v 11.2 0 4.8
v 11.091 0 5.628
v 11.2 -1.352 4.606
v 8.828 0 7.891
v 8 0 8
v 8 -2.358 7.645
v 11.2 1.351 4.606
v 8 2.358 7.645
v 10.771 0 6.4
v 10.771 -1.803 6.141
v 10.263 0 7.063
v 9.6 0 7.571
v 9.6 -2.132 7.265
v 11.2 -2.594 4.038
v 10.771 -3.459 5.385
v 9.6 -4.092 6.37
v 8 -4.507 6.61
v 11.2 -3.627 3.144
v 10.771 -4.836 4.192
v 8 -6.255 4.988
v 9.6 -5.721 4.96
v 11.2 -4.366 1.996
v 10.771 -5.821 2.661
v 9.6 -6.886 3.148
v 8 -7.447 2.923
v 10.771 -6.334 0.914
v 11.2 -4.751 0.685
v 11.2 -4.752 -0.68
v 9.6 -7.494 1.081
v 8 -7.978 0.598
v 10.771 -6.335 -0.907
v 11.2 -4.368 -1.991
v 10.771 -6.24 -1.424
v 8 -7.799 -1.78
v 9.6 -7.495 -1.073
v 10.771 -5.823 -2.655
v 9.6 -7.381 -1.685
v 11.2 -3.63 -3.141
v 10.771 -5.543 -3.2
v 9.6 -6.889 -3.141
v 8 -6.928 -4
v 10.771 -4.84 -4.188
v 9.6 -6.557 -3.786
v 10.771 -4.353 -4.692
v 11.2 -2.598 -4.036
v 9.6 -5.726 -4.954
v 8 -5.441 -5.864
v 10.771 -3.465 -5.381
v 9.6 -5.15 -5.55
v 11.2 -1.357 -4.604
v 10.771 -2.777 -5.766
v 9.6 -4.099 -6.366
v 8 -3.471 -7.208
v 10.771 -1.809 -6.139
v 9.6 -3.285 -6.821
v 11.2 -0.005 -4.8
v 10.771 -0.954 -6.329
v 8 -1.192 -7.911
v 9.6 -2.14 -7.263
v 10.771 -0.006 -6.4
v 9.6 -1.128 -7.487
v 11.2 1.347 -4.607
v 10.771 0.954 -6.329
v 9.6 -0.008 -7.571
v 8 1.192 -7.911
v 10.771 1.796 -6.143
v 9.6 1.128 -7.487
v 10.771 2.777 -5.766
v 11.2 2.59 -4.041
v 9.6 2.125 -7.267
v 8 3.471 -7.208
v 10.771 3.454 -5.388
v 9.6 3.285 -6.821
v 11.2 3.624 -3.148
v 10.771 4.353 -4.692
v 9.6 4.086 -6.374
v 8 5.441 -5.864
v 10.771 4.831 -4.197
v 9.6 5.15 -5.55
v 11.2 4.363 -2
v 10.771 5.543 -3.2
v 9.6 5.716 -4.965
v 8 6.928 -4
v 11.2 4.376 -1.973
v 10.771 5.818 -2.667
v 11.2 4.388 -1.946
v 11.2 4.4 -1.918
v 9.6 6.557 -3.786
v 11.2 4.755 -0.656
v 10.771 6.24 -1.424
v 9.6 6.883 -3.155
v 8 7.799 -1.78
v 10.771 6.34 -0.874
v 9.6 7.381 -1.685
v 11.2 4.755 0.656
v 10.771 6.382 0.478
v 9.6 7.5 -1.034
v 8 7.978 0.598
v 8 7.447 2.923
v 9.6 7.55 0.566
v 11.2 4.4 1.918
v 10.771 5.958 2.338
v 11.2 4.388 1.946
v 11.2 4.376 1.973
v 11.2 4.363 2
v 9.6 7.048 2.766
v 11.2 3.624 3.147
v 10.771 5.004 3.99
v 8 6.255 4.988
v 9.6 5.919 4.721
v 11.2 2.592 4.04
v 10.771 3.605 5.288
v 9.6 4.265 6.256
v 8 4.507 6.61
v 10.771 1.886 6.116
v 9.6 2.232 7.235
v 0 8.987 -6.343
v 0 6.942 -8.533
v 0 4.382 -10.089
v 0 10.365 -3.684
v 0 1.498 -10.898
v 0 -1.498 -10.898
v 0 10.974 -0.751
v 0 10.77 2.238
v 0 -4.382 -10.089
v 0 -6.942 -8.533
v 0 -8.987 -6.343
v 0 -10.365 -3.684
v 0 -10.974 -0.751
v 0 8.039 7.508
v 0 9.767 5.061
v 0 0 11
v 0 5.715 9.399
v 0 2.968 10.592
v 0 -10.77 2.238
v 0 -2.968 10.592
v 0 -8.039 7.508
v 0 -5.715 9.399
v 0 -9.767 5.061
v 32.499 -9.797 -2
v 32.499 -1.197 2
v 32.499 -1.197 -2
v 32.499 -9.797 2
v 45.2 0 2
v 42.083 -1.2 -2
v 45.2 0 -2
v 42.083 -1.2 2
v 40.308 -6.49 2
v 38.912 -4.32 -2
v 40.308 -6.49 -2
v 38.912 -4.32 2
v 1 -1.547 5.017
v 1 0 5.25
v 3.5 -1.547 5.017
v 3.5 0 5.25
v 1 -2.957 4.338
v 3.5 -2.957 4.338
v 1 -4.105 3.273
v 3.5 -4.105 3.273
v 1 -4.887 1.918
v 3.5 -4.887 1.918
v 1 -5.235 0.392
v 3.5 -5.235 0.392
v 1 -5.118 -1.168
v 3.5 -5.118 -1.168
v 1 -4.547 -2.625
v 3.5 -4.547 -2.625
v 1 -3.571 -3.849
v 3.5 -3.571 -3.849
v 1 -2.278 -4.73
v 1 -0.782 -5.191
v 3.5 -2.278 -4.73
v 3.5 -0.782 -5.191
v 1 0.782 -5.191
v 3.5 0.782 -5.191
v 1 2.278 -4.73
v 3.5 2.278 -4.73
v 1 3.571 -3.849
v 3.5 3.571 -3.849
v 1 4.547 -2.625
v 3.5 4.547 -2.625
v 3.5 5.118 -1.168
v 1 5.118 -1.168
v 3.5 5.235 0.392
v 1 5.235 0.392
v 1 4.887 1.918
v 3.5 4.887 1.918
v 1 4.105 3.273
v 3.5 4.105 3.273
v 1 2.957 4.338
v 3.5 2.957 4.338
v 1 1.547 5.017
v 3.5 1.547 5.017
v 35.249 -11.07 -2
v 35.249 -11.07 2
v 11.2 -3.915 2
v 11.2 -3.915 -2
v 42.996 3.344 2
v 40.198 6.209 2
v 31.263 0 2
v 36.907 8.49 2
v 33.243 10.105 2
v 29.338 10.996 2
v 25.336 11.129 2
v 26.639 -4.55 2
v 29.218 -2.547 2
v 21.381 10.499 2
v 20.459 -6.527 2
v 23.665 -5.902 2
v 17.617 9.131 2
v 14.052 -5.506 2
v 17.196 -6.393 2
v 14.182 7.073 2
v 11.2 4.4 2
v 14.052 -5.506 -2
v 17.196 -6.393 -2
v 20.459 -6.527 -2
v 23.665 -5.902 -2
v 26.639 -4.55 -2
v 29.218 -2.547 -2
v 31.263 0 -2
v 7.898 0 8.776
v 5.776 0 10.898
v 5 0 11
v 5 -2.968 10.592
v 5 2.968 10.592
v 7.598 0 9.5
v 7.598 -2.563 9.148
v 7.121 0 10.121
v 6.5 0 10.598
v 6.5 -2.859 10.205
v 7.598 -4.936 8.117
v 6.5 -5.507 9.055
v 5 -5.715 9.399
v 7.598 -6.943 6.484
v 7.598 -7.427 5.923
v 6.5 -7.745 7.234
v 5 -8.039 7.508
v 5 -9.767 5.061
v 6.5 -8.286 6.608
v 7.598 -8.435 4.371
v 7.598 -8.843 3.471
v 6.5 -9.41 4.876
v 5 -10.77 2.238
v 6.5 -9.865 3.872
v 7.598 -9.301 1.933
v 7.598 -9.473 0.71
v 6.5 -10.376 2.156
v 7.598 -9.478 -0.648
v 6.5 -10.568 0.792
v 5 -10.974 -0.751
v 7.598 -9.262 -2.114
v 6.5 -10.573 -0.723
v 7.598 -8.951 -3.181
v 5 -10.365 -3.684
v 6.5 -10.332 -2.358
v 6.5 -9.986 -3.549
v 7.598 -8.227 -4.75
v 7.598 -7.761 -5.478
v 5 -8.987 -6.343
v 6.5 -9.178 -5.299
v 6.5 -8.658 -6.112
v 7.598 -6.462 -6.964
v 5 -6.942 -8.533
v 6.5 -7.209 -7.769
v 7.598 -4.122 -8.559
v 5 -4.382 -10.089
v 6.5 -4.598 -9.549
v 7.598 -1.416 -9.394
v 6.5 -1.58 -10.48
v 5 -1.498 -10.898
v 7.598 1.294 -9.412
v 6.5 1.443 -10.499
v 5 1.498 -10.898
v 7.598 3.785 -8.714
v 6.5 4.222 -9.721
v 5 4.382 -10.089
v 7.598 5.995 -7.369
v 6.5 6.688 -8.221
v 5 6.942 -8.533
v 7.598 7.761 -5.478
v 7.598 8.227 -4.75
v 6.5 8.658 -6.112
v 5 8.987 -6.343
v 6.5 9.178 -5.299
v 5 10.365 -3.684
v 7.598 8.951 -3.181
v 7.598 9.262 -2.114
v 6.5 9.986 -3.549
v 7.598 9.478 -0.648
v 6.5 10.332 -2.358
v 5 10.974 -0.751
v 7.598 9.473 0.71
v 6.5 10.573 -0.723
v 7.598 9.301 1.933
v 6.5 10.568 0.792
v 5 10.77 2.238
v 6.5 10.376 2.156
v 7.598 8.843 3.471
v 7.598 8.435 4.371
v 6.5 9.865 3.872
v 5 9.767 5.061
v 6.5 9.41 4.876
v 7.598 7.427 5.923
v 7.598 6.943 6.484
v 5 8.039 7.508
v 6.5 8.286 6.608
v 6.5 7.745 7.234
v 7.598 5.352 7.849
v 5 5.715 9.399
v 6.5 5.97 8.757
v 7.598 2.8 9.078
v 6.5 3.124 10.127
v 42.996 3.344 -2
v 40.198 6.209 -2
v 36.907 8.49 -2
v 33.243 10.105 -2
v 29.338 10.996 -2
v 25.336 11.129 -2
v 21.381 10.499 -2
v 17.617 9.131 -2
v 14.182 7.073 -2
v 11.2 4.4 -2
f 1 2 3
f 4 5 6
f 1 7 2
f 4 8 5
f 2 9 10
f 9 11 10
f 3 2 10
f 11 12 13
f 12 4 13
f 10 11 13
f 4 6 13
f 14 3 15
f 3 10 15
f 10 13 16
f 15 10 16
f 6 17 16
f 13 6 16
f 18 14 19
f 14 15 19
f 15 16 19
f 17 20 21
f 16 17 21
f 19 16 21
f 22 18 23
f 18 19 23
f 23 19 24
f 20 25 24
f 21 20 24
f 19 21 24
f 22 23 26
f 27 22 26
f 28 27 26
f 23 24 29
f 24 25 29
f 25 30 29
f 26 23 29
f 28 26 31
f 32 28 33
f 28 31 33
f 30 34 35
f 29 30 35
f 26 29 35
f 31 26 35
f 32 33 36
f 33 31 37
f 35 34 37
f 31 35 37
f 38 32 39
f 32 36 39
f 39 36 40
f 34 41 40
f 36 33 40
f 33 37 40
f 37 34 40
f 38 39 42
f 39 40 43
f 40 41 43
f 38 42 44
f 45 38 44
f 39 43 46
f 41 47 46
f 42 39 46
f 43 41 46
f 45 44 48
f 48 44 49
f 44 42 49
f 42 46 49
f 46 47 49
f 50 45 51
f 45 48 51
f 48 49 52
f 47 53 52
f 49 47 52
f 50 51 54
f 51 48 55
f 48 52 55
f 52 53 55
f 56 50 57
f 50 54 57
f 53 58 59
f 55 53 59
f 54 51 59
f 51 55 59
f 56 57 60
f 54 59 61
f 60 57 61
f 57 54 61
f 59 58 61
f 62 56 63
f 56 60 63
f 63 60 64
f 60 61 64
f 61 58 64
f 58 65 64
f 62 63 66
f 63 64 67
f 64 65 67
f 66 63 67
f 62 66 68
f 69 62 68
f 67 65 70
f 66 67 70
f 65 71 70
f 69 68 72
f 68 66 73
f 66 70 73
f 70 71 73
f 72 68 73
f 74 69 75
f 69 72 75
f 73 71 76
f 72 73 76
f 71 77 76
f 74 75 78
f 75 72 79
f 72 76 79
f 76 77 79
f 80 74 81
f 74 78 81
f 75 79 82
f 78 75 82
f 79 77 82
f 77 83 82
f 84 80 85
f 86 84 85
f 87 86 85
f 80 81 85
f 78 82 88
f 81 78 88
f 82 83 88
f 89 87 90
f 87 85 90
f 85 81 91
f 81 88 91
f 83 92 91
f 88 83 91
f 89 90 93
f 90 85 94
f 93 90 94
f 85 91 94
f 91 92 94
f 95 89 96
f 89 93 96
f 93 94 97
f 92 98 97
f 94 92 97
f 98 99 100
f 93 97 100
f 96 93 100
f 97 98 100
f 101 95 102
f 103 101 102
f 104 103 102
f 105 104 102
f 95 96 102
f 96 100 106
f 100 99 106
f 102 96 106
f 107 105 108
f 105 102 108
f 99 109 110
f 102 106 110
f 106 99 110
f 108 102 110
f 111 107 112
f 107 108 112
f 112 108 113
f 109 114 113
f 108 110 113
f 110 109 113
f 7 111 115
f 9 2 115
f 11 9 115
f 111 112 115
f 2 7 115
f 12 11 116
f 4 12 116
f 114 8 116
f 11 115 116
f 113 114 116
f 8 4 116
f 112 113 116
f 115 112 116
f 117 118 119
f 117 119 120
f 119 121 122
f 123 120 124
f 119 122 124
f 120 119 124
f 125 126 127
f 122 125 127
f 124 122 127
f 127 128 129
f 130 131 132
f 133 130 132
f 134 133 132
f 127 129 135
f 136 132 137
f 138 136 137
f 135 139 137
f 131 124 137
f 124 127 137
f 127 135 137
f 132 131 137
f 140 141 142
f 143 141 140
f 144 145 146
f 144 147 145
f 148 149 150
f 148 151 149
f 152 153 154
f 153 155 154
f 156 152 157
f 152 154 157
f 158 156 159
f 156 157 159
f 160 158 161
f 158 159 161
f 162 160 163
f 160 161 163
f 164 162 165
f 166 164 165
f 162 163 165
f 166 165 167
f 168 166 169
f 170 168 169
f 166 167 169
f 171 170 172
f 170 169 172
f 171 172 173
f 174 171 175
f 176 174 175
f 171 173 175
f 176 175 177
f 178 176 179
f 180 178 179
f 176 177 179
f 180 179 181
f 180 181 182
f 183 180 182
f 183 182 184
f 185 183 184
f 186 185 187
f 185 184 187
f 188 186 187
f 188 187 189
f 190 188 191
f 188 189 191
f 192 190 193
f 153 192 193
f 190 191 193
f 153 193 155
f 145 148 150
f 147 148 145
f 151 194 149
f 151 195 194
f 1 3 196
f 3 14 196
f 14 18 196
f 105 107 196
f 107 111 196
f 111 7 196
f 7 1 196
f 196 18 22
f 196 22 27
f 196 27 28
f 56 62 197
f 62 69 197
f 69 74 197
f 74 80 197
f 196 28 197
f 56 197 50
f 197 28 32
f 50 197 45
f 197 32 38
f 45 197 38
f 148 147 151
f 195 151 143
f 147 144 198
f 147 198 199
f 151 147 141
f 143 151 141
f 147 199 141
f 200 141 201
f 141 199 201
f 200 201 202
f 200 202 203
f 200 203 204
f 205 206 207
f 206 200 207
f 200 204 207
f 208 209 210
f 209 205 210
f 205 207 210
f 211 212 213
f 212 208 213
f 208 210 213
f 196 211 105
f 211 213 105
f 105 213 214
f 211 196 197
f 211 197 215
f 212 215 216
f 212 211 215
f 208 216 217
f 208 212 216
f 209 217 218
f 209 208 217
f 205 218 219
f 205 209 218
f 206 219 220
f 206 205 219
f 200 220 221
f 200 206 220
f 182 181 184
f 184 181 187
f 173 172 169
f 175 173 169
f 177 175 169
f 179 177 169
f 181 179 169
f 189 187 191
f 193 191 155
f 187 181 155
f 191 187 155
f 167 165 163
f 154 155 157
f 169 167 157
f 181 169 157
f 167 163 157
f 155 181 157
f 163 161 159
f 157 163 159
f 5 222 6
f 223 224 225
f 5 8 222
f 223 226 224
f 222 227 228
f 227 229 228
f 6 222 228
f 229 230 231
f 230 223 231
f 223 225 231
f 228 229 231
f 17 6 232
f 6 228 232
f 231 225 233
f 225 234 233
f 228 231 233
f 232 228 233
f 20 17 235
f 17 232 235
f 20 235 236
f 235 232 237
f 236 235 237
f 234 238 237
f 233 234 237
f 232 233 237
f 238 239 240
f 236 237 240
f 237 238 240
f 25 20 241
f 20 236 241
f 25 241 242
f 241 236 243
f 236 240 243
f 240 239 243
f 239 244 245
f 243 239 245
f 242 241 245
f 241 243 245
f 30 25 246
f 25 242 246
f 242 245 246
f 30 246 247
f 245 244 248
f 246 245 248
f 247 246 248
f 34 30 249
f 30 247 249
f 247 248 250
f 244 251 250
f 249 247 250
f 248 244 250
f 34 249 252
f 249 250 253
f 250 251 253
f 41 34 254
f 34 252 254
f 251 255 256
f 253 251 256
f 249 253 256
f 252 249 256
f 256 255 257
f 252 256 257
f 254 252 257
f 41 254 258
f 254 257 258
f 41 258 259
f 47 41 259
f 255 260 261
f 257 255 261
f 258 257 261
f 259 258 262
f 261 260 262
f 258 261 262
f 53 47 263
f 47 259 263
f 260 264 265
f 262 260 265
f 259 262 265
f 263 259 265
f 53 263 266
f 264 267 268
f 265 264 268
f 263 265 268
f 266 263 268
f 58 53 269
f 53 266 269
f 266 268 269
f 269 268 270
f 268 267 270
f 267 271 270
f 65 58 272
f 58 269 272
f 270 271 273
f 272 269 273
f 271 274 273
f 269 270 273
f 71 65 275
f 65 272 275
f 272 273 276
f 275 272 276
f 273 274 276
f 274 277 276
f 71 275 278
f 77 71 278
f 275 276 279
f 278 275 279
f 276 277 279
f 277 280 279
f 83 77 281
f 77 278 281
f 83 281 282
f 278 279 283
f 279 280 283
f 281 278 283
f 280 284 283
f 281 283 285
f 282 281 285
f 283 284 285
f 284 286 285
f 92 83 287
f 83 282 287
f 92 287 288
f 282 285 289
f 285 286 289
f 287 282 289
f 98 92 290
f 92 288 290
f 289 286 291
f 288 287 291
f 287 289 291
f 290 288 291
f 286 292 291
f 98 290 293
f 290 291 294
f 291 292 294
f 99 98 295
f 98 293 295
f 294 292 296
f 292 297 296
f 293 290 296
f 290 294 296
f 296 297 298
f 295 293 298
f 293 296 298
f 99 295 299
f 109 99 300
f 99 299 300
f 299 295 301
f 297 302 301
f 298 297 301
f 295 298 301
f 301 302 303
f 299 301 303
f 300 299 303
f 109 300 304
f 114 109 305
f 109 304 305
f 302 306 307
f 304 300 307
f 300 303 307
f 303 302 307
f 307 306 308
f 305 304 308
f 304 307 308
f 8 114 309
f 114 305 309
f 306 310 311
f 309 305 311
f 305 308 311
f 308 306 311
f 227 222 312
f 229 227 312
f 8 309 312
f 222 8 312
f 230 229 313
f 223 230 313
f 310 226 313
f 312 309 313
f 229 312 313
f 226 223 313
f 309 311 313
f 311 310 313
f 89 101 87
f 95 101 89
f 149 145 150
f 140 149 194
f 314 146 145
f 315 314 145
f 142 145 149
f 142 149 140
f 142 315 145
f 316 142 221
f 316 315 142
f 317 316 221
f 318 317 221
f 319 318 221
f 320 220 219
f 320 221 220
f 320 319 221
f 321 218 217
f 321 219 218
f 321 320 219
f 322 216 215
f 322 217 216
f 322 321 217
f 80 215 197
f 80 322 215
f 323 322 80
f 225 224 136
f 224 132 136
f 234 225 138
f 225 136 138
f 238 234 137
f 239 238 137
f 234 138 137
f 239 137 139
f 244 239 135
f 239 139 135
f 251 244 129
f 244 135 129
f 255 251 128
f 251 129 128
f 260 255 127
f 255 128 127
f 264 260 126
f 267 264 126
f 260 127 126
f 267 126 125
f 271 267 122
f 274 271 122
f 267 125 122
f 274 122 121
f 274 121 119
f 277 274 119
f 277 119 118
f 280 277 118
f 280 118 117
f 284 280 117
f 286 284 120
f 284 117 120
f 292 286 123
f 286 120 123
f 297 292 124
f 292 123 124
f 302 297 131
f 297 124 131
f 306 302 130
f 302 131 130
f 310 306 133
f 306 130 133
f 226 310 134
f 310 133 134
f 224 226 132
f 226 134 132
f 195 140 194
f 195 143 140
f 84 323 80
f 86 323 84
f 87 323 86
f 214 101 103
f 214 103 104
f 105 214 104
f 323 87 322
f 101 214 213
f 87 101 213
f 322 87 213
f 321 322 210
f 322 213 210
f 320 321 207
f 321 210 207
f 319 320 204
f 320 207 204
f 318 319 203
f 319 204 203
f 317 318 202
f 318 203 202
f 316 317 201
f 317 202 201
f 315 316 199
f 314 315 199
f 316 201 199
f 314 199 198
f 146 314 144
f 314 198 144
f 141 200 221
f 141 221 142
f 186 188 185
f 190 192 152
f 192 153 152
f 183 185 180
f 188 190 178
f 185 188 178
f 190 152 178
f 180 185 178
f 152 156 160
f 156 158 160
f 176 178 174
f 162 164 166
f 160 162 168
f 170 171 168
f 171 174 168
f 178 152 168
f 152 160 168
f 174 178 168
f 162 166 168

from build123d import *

# Parameters (mm, degrees)
EXTRUDE_1931_DEPTH = 2


with BuildPart() as part:
    # Sketch 231 → Повернуть1 (revolve)
    with BuildSketch(Plane.XY):
        with BuildLine():
            Line((0, 11), (0, 0))
            Line((0, 0), (1, 0))
            Line((1, 0), (1, 5.25))
            Line((1, 5.25), (3.5, 5.25))
            Line((3.5, 5.25), (3.5, 0))
            Line((3.5, 0), (11.2, 0))
            Line((11.2, 0), (11.2, 4.8))
            ThreePointArc((11.2, 4.8), (10.2627417, 7.0627417), (8, 8))
            ThreePointArc((8, 8), (7.121320344, 10.121320344), (5, 11))
            Line((5, 11), (0, 11))
        make_face()
    revolve(axis=Axis((0, 0, 0), (1, 0, 0)))

    # Sketch 913 → Extrude 1931 (add, symmetric)
    with BuildSketch(Plane.XY):
        with BuildLine():
            Line((11.2, 4.4), (11.2, -3.914978255))
            ThreePointArc((11.2, -3.914978255), (22.080678837, -6.30816882), (31.263463773, 0))
            Line((31.263463773, 0), (32.498964702, -1.197255299))
            Line((32.498964702, -1.197255299), (32.498964702, -9.797255299))
            Line((32.498964702, -9.797255299), (35.248695767, -11.07))
            Line((35.248695767, -11.07), (38.912013935, -4.32))
            Line((38.912013935, -4.32), (40.307542508, -6.49))
            Line((40.307542508, -6.49), (42.083014277, -1.2))
            Line((42.083014277, -1.2), (45.2, 0))
            ThreePointArc((45.2, 0), (29.338267199, 10.995701086), (11.2, 4.4))
        make_face()
    extrude(amount=EXTRUDE_1931_DEPTH, both=True)


solid = part.part
